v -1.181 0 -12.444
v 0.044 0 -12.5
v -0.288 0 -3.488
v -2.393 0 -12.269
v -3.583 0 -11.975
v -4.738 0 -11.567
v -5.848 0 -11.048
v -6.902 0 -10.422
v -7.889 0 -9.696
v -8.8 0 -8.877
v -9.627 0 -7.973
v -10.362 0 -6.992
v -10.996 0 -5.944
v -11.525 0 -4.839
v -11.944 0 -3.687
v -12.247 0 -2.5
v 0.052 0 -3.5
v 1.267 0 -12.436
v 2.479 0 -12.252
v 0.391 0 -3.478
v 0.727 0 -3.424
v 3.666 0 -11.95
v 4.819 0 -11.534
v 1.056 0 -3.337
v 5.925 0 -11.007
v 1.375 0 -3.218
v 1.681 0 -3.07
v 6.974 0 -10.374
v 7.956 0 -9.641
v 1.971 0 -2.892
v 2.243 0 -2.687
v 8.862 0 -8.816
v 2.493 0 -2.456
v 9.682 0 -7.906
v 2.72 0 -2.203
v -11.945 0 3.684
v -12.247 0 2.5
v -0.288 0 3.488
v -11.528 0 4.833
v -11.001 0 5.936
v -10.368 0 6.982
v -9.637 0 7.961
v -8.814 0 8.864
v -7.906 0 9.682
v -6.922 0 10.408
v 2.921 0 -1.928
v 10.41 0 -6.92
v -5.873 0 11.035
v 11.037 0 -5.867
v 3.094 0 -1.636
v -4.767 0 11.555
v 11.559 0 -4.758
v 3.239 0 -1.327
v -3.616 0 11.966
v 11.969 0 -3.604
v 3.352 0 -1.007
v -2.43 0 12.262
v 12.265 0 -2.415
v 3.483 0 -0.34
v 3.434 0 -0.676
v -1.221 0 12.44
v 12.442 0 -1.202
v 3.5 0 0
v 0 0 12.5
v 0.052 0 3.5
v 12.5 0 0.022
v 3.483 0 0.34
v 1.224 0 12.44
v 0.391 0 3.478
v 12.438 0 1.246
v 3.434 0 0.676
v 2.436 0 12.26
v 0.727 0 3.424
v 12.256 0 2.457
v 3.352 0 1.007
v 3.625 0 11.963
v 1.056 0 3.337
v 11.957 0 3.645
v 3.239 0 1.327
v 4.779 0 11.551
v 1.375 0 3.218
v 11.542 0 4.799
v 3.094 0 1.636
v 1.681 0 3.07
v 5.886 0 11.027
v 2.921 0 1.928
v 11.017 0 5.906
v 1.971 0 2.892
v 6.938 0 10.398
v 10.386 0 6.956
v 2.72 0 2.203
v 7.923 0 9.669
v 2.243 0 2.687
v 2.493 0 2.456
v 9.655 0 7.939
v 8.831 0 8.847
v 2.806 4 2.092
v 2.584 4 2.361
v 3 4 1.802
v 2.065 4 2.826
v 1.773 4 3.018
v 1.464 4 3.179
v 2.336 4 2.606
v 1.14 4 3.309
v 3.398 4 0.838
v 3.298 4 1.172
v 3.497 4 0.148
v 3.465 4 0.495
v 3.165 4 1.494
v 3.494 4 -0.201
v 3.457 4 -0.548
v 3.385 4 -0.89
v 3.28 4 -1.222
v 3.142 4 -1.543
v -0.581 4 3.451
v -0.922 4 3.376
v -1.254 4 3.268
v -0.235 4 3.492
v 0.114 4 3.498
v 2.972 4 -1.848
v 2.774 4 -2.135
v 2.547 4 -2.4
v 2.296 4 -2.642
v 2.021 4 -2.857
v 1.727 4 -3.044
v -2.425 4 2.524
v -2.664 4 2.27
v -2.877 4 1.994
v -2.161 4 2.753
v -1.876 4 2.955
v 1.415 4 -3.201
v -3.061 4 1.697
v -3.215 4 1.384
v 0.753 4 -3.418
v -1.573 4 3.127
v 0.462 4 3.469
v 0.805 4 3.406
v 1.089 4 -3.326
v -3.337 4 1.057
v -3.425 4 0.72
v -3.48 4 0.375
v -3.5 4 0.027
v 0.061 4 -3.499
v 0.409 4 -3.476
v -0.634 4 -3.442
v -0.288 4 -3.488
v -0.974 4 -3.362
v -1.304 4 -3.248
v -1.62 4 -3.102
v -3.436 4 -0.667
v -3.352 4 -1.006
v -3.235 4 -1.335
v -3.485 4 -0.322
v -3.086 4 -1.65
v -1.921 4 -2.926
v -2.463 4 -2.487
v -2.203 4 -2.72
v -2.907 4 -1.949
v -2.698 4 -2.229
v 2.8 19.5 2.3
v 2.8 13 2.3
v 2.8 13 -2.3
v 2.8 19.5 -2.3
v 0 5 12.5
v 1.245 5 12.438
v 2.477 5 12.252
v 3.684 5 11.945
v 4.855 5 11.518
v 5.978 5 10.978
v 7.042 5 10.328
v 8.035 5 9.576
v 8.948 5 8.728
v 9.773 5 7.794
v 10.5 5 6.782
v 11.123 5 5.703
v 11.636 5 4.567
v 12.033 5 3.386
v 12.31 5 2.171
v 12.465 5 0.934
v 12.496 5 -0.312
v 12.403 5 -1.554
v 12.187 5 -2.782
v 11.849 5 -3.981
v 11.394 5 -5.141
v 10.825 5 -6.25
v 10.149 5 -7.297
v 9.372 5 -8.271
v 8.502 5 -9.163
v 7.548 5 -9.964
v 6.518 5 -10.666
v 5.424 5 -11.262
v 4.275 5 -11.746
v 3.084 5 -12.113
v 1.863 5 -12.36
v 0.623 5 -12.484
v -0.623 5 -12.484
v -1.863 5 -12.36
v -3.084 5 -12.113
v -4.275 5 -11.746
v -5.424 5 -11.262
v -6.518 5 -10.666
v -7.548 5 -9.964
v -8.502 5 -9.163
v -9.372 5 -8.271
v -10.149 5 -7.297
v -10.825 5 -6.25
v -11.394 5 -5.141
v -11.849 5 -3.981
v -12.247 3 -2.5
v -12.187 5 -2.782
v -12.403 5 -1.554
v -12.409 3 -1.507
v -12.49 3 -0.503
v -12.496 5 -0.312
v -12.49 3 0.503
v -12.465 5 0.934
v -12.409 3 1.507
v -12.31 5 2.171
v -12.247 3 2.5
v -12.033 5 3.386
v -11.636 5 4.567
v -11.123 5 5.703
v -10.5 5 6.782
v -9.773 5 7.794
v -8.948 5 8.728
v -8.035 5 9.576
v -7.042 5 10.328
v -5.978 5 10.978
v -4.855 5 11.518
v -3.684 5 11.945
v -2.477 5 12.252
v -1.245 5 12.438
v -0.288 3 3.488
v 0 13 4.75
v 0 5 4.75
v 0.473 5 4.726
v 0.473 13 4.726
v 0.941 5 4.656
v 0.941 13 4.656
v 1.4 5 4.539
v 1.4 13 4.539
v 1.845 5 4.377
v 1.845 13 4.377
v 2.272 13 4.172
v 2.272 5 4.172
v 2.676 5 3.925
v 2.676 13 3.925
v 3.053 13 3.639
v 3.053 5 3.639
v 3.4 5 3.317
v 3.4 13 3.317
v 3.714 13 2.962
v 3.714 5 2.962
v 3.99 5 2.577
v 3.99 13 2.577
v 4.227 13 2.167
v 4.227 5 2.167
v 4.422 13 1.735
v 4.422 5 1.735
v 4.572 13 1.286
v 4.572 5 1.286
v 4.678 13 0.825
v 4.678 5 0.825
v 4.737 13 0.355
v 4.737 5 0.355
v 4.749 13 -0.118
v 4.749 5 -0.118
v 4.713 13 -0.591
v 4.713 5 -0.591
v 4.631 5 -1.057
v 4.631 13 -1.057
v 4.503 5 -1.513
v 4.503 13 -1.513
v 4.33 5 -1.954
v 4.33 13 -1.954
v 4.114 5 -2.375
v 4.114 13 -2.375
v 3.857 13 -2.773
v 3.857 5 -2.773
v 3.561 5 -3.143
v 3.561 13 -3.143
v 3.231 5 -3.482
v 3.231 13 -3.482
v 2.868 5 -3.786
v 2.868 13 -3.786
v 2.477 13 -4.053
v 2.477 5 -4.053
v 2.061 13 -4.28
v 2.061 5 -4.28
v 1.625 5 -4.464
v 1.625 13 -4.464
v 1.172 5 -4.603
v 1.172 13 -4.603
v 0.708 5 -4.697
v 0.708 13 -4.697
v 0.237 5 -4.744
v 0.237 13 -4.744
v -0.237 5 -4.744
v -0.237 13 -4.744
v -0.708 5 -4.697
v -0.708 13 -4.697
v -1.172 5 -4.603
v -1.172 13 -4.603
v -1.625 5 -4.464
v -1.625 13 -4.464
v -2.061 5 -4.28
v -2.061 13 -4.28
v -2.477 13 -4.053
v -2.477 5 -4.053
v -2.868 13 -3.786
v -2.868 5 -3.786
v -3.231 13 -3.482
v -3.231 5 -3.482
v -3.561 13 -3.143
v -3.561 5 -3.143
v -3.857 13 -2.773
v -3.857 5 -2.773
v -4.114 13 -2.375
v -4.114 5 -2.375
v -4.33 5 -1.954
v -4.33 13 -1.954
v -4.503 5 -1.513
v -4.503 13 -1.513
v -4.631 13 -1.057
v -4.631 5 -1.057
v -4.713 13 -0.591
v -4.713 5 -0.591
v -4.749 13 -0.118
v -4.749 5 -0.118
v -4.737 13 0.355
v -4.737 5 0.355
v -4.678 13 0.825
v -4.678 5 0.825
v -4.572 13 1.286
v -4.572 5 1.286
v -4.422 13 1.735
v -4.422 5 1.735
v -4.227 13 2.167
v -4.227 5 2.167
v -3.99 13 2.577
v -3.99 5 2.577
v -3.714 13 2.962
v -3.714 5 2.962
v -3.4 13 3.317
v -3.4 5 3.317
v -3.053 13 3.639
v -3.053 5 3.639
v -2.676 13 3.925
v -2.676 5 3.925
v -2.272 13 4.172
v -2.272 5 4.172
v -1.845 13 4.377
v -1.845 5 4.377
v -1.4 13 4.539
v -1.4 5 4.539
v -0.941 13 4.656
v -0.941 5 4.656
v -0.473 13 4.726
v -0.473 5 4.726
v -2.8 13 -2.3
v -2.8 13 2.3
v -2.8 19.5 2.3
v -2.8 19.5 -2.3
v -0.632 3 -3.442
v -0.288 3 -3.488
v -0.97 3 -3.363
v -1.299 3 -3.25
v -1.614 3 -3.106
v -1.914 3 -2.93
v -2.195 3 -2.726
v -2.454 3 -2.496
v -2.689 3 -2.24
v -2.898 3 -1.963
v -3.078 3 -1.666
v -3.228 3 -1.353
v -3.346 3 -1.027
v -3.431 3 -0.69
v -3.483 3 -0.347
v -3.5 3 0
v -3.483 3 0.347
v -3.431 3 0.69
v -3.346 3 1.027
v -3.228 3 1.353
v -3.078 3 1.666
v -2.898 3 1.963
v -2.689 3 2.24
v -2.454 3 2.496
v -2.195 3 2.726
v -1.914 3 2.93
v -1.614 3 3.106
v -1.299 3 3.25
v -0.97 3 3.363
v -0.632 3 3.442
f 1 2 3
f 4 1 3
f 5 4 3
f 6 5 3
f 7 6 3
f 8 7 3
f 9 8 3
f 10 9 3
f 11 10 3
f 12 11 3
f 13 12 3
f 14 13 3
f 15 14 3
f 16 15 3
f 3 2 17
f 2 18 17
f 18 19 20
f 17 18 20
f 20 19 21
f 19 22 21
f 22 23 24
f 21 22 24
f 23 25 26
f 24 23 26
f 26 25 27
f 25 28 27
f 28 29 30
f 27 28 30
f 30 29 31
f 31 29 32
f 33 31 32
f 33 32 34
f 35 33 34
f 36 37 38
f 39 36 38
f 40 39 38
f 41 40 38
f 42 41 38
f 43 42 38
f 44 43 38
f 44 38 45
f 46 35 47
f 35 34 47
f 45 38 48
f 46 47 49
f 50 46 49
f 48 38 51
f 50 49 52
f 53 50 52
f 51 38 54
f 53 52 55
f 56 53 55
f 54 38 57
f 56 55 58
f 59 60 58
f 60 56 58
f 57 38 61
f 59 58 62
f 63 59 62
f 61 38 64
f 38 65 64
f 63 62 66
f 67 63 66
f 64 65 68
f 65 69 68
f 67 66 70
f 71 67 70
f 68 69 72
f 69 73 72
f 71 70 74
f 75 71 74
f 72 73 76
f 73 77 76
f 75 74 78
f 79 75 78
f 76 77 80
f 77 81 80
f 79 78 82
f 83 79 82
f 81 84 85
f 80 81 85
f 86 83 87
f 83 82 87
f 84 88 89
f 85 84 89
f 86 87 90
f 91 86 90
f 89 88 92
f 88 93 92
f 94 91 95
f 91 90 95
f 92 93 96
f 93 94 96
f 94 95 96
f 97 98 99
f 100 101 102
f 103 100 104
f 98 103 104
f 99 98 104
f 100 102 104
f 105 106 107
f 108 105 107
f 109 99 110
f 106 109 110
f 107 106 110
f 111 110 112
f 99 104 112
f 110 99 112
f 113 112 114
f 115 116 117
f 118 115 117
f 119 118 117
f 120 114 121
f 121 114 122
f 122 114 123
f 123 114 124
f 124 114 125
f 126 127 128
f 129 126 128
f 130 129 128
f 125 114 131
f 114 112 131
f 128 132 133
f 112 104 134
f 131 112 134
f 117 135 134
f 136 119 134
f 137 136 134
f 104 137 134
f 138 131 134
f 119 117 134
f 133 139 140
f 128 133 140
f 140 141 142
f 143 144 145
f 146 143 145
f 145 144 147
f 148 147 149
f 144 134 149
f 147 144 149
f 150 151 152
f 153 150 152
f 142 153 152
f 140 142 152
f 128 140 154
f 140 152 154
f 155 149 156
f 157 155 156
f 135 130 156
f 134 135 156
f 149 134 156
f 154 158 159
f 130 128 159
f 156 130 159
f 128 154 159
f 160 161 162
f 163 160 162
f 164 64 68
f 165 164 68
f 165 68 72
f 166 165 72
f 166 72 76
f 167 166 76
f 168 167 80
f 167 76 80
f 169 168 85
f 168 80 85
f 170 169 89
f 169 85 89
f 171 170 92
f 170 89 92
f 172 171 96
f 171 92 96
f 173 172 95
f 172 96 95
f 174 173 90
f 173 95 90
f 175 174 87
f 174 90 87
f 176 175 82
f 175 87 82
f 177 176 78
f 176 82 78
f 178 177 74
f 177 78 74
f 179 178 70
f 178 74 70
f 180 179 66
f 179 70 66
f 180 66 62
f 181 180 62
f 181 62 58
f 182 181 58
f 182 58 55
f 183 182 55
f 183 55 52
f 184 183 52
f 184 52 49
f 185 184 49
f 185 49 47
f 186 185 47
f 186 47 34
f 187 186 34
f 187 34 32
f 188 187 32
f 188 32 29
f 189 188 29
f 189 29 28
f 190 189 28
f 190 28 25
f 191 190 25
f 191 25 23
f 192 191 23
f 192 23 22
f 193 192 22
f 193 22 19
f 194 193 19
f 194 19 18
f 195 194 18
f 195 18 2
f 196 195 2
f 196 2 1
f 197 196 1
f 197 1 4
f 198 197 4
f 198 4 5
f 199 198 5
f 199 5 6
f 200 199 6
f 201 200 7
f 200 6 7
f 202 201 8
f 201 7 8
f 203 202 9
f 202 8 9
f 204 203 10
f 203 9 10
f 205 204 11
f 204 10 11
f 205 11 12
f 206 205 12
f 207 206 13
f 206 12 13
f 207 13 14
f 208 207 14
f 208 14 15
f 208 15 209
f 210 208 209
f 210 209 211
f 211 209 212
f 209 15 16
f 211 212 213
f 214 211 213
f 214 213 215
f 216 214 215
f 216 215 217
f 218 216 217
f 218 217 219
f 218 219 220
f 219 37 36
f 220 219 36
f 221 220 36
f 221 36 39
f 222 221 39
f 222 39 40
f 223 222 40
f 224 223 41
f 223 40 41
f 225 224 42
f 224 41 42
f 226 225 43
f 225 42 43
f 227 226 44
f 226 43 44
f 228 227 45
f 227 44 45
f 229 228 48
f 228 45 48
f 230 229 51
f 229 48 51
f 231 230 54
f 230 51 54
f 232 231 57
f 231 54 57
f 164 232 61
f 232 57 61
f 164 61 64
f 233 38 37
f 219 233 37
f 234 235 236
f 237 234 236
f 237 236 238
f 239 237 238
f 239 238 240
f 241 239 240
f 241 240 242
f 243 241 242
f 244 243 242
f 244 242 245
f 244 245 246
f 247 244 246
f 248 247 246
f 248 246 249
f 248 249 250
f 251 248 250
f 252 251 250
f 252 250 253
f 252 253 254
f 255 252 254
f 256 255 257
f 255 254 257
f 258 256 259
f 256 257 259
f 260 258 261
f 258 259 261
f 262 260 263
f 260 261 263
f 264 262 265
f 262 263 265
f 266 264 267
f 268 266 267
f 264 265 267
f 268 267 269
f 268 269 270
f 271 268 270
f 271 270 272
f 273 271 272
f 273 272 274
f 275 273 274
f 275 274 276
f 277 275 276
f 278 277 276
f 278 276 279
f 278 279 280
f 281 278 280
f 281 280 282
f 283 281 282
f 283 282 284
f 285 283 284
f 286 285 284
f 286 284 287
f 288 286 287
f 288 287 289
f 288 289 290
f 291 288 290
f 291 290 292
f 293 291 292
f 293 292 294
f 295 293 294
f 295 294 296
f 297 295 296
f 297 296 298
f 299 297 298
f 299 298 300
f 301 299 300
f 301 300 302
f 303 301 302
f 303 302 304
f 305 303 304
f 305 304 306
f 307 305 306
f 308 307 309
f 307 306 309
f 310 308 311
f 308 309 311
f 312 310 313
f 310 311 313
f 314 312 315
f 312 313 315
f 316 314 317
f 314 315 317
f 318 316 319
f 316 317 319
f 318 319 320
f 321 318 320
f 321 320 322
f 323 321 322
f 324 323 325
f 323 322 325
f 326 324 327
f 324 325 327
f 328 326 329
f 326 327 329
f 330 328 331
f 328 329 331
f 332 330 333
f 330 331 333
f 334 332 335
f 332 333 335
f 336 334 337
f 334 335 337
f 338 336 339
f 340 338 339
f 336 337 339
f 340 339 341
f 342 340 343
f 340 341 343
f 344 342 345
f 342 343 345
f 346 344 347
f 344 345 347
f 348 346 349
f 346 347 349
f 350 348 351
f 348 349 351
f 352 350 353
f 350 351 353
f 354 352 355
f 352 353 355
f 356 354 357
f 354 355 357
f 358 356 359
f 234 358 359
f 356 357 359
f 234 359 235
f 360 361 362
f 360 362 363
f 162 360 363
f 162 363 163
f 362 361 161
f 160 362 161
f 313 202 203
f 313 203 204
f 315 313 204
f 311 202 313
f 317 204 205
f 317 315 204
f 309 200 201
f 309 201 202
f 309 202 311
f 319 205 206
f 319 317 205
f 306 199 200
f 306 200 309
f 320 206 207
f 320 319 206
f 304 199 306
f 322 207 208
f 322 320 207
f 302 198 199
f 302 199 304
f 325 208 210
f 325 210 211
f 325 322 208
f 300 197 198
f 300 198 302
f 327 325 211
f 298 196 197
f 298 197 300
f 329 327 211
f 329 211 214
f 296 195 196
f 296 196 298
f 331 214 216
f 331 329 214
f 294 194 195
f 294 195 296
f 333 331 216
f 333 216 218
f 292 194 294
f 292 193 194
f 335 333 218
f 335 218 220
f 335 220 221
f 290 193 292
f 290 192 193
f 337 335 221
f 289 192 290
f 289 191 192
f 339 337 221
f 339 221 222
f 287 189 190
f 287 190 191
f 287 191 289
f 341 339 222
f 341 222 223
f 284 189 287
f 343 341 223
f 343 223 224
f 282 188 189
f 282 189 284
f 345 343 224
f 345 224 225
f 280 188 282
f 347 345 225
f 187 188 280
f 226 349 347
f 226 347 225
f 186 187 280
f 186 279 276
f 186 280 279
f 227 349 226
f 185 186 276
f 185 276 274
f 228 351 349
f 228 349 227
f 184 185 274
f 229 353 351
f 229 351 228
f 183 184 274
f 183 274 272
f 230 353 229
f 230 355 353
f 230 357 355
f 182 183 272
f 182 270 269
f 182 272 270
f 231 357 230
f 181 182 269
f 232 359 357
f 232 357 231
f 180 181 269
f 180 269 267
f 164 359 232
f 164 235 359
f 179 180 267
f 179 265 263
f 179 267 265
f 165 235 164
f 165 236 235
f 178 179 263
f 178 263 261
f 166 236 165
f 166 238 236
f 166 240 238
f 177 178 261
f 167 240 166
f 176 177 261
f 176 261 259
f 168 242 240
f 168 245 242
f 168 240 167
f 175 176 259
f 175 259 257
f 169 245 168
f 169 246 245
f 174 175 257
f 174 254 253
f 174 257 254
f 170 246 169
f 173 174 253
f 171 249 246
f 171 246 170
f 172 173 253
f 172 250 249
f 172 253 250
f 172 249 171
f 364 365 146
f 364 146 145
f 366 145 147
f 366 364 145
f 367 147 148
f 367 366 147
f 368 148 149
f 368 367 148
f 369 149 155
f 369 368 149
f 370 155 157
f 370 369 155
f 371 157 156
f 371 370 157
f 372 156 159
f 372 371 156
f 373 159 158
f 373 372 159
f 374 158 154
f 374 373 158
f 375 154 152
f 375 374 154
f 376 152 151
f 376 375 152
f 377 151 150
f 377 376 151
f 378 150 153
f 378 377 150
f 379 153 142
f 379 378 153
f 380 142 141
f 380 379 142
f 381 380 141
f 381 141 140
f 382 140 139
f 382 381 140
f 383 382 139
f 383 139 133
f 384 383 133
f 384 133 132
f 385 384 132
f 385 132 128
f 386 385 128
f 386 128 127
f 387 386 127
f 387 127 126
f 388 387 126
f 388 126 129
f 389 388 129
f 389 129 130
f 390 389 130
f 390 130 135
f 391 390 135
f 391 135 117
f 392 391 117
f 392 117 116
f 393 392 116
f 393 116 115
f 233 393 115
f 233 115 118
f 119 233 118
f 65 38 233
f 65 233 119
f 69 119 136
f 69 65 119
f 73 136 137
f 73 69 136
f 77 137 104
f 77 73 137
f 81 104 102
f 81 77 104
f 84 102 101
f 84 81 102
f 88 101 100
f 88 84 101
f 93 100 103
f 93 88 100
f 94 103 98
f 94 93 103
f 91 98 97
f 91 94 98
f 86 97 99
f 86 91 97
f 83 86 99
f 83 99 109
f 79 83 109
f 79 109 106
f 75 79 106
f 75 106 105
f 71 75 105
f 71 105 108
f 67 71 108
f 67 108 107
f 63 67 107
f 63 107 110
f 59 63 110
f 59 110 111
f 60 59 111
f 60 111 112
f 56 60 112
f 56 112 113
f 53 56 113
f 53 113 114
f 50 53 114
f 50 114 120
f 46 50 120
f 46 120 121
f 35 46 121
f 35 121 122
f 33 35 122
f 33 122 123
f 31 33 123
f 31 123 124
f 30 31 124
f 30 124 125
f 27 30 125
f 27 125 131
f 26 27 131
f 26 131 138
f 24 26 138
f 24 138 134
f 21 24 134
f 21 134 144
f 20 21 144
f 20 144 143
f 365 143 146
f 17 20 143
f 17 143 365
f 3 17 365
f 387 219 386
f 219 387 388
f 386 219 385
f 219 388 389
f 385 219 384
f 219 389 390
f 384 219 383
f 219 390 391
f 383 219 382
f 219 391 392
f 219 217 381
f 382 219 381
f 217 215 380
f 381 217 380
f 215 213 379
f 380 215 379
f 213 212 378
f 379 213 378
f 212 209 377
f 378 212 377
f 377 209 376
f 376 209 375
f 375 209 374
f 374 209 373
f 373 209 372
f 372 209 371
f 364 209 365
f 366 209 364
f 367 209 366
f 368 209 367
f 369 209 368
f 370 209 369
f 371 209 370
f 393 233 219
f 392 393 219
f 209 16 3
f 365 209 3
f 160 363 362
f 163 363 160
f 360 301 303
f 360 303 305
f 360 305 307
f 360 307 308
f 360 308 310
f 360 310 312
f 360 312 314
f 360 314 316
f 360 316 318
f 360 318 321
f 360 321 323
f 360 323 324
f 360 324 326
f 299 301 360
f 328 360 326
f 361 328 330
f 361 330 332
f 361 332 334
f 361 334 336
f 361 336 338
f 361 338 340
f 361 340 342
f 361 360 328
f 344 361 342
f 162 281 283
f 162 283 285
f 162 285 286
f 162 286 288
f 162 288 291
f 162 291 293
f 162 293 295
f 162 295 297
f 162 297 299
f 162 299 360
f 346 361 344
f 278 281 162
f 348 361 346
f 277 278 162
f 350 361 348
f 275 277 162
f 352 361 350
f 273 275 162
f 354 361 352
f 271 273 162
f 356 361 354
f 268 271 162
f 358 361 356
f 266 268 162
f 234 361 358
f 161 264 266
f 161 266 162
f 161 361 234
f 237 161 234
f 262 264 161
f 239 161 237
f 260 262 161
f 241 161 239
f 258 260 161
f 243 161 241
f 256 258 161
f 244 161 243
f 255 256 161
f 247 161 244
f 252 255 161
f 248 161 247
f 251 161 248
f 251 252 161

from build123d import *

# Parameters (mm, degrees)
SKETCH1_R           = 12.5
SKETCH1_R_2         = 4.75
BOSS_EXTRUDE1_DEPTH = 5
SKETCH1_3_R         = 4.75
SKETCH1_3_W         = 5.6
SKETCH1_3_H         = 4.6
BOSS_EXTRUDE2_DEPTH = 13
SKETCH1_4_W         = 5.6
SKETCH1_4_H         = 4.6
BOSS_EXTRUDE3_DEPTH = 19.5
CUT_EXTRUDE2_DEPTH  = 3
CUT_EXTRUDE3_DEPTH  = 4


with BuildPart() as part:
    # Sketch1 → Boss-Extrude1 (new body)
    with BuildSketch(Plane(origin=(0, 0, 0), x_dir=(1, 0, 0), z_dir=(0, 1, 0))):
        Circle(SKETCH1_R)
        Circle(SKETCH1_R_2, mode=Mode.SUBTRACT)
    extrude(amount=BOSS_EXTRUDE1_DEPTH)

    # Sketch1<3> → Boss-Extrude2 (add)
    with BuildSketch(Plane(origin=(0, 0, 0), x_dir=(1, 0, 0), z_dir=(0, 1, 0))):
        Circle(SKETCH1_3_R)
        Rectangle(SKETCH1_3_W, SKETCH1_3_H, mode=Mode.SUBTRACT)
    extrude(amount=BOSS_EXTRUDE2_DEPTH)

    # Sketch1<4> → Boss-Extrude3 (add)
    with BuildSketch(Plane(origin=(0, 0, 0), x_dir=(1, 0, 0), z_dir=(0, 1, 0))):
        Rectangle(SKETCH1_4_W, SKETCH1_4_H)
    extrude(amount=BOSS_EXTRUDE3_DEPTH)

    # Sketch2 → Cut-Extrude2 (cut)
    with BuildSketch(Plane(origin=(0, 0, 0), x_dir=(1, 0, 0), z_dir=(0, 1, 0))):
        with BuildLine():
            Line((-0.288199979, 3.488114214), (-12.247448714, 2.5))
            ThreePointArc((-12.247448714, 2.5), (-12.5, 0), (-12.247448714, -2.5))
            Line((-12.247448714, -2.5), (-0.288199979, -3.488114214))
            ThreePointArc((-0.288199979, -3.488114214), (3.5, 0), (-0.288199979, 3.488114214))
        make_face()
    extrude(amount=CUT_EXTRUDE2_DEPTH, mode=Mode.SUBTRACT)

    # Sketch2<3> → Cut-Extrude3 (cut)
    with BuildSketch(Plane(origin=(0, 0, 0), x_dir=(1, 0, 0), z_dir=(0, 1, 0))):
        with BuildLine():
            ThreePointArc((-0.288199979, 3.488114214), (-3.5, 0), (-0.288199979, -3.488114214))
            ThreePointArc((-0.288199979, -3.488114214), (2.370791015, -2.574752408), (3.5, 0))
            ThreePointArc((3.5, 0), (2.370791015, 2.574752408), (-0.288199979, 3.488114214))
        make_face()
    extrude(amount=CUT_EXTRUDE3_DEPTH, mode=Mode.SUBTRACT)


solid = part.part
